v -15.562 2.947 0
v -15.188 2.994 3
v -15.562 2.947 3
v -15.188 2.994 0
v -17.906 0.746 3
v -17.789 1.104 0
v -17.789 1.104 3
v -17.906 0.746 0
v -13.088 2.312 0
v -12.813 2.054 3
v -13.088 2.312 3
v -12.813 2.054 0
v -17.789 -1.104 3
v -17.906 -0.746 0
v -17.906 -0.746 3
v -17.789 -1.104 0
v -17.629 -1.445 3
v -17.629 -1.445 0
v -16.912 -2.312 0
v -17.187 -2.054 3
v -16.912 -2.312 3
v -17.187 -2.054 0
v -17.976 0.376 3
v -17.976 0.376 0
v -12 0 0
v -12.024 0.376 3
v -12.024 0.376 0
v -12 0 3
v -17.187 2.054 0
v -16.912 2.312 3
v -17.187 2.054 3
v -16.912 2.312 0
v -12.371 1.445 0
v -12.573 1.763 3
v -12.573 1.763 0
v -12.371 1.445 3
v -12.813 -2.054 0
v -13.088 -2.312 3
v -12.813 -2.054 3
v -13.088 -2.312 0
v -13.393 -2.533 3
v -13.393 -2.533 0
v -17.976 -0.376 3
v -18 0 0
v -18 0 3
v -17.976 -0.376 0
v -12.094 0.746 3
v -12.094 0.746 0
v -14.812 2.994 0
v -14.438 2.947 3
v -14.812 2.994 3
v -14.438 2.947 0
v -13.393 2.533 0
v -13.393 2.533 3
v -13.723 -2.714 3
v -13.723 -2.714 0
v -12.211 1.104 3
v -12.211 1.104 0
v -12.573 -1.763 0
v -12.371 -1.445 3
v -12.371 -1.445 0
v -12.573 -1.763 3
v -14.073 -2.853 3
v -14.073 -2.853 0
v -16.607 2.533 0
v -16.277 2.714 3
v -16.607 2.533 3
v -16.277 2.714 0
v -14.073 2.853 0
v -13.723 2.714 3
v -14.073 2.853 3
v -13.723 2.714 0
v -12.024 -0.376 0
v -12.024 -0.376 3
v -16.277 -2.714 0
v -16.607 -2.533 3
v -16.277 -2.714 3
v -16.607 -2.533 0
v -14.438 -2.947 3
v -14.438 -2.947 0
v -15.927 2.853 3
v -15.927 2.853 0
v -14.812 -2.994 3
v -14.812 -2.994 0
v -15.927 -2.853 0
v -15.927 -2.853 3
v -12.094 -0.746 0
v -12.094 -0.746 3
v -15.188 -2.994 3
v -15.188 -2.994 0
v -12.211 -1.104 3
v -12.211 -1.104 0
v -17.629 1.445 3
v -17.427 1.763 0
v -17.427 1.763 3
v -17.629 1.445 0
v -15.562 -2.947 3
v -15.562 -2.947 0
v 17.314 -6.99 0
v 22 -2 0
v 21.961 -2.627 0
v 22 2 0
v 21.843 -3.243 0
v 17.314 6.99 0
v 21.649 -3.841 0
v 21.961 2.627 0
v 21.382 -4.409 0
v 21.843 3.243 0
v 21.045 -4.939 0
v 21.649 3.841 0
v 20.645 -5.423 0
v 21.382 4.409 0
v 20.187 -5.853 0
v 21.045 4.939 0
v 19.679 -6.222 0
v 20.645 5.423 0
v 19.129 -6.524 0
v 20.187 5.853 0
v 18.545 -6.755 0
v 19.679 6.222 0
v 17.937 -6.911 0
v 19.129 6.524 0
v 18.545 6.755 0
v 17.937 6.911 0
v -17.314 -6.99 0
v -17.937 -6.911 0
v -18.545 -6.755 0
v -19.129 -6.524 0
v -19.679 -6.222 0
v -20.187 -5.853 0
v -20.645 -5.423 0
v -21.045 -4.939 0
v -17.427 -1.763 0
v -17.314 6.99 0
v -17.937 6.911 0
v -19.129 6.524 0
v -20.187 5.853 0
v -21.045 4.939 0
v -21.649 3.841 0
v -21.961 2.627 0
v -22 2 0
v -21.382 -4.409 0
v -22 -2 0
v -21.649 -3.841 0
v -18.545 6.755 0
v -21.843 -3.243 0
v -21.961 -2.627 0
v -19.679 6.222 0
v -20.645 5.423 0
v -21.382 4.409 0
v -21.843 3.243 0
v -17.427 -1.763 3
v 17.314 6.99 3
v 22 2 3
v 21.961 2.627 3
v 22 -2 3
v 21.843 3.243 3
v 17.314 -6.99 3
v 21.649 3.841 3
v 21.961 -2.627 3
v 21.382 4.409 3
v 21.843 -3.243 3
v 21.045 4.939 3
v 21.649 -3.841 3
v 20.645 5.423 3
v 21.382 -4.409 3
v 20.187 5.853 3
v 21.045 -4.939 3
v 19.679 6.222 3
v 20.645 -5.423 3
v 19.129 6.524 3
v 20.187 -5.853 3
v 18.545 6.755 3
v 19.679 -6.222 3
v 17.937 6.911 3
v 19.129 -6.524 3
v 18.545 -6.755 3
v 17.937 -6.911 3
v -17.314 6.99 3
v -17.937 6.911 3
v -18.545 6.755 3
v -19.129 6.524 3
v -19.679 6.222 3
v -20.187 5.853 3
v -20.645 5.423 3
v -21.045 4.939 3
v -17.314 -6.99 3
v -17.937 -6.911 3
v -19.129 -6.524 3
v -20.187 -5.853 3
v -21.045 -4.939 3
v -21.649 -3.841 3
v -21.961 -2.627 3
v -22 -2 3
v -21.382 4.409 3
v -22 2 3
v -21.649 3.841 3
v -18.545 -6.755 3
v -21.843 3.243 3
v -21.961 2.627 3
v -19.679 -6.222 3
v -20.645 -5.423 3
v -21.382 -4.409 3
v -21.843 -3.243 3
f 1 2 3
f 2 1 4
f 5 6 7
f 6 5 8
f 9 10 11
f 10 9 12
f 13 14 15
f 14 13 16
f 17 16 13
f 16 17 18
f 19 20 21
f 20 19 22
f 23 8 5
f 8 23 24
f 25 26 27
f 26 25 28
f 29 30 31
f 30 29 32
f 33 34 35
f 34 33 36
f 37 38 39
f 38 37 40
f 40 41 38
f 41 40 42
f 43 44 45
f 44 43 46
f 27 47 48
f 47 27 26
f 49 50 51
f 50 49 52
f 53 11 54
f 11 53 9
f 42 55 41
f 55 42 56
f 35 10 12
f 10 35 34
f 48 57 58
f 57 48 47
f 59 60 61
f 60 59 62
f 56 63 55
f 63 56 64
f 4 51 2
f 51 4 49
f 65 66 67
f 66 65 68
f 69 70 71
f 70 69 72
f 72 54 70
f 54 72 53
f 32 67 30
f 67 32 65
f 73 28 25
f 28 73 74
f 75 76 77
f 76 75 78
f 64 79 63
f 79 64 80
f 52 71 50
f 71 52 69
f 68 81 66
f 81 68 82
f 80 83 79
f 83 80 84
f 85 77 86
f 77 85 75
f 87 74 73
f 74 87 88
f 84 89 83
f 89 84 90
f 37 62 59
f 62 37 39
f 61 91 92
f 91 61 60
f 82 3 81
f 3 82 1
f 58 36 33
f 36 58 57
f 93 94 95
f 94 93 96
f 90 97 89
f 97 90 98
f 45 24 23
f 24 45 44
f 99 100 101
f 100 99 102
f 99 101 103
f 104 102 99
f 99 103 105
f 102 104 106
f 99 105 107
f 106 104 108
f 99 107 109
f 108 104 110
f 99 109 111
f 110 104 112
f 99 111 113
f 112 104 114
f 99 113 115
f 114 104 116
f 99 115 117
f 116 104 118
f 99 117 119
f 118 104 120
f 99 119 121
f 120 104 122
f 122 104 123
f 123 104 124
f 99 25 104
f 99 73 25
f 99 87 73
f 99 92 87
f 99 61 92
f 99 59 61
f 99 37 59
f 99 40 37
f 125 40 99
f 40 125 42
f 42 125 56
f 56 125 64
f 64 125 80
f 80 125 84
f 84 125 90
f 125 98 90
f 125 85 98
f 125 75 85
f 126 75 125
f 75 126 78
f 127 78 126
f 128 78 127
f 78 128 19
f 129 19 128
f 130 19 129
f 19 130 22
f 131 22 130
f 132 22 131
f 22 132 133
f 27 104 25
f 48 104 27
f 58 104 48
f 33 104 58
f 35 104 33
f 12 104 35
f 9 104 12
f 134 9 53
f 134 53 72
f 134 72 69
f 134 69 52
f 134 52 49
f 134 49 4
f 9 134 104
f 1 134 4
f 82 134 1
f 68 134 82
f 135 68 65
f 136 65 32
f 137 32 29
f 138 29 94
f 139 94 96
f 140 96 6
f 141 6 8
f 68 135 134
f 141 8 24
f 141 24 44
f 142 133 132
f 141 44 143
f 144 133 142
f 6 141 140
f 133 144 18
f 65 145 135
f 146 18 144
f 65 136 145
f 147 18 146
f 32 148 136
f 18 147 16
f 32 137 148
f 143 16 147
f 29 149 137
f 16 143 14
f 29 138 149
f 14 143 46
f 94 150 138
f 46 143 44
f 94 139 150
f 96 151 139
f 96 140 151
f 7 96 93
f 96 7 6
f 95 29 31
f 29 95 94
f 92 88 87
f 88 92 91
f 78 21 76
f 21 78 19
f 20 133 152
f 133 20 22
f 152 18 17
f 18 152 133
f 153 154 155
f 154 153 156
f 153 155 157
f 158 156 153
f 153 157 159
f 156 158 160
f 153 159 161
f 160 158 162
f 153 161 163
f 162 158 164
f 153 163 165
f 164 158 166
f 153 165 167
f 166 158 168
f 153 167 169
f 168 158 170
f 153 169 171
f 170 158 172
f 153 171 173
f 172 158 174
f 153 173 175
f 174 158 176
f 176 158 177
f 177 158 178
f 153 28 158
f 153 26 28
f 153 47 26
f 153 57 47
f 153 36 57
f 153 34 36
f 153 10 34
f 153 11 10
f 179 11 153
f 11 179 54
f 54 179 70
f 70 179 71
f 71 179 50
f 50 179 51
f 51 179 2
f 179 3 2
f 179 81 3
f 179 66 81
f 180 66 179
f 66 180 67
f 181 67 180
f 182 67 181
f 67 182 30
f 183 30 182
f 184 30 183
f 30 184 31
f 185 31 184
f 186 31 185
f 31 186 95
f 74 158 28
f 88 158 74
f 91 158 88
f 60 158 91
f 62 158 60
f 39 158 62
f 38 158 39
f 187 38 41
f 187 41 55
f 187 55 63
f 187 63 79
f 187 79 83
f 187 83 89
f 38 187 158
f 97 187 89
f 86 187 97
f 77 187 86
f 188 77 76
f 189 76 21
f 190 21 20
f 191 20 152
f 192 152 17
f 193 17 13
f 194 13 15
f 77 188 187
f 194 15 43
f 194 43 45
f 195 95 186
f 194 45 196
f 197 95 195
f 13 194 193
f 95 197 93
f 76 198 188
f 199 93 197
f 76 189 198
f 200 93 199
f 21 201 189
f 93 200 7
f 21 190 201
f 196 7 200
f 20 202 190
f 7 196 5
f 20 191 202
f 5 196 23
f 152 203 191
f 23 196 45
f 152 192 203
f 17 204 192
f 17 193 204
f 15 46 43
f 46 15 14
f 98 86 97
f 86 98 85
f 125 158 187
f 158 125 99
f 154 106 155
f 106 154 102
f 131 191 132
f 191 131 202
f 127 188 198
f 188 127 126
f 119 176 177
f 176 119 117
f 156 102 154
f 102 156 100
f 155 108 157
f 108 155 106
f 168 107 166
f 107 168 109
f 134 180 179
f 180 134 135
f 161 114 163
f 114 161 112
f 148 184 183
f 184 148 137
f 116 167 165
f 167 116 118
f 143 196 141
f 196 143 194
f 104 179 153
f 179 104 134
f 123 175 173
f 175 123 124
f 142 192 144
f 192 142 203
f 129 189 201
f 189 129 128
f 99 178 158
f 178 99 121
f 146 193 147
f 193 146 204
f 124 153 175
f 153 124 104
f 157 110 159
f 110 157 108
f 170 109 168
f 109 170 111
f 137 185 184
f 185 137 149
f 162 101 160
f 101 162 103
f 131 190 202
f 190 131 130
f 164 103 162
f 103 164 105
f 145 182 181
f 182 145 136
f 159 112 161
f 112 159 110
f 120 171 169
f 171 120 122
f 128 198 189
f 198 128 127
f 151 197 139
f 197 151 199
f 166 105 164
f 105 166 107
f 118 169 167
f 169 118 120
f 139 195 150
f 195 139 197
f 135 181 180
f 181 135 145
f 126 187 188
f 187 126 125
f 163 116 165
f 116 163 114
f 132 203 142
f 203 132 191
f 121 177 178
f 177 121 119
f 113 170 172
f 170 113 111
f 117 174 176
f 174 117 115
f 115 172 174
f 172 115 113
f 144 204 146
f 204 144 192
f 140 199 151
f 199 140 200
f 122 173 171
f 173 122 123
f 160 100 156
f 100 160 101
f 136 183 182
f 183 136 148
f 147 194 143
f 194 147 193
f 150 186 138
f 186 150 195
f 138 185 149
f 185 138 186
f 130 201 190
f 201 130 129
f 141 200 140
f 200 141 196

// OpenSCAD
$fn = 50;


difference() {
	union() {
		hull() {
			translate(v = [-17.0000000000, 2.0000000000, 0]) {
				cylinder(h = 3, r = 5);
			}
			translate(v = [17.0000000000, 2.0000000000, 0]) {
				cylinder(h = 3, r = 5);
			}
			translate(v = [-17.0000000000, -2.0000000000, 0]) {
				cylinder(h = 3, r = 5);
			}
			translate(v = [17.0000000000, -2.0000000000, 0]) {
				cylinder(h = 3, r = 5);
			}
		}
	}
	union() {
		translate(v = [-15.0000000000, 0.0000000000, 0]) {
			cylinder(h = 3, r = 3.0000000000);
		}
		translate(v = [-15.0000000000, 0.0000000000, 0]) {
			cylinder(h = 3, r = 1.5000000000);
		}
		translate(v = [-15.0000000000, 0.0000000000, 0]) {
			cylinder(h = 3, r = 1.5000000000);
		}
		translate(v = [-15.0000000000, 0.0000000000, 0]) {
			cylinder(h = 3, r = 1.5000000000);
		}
	}
}
